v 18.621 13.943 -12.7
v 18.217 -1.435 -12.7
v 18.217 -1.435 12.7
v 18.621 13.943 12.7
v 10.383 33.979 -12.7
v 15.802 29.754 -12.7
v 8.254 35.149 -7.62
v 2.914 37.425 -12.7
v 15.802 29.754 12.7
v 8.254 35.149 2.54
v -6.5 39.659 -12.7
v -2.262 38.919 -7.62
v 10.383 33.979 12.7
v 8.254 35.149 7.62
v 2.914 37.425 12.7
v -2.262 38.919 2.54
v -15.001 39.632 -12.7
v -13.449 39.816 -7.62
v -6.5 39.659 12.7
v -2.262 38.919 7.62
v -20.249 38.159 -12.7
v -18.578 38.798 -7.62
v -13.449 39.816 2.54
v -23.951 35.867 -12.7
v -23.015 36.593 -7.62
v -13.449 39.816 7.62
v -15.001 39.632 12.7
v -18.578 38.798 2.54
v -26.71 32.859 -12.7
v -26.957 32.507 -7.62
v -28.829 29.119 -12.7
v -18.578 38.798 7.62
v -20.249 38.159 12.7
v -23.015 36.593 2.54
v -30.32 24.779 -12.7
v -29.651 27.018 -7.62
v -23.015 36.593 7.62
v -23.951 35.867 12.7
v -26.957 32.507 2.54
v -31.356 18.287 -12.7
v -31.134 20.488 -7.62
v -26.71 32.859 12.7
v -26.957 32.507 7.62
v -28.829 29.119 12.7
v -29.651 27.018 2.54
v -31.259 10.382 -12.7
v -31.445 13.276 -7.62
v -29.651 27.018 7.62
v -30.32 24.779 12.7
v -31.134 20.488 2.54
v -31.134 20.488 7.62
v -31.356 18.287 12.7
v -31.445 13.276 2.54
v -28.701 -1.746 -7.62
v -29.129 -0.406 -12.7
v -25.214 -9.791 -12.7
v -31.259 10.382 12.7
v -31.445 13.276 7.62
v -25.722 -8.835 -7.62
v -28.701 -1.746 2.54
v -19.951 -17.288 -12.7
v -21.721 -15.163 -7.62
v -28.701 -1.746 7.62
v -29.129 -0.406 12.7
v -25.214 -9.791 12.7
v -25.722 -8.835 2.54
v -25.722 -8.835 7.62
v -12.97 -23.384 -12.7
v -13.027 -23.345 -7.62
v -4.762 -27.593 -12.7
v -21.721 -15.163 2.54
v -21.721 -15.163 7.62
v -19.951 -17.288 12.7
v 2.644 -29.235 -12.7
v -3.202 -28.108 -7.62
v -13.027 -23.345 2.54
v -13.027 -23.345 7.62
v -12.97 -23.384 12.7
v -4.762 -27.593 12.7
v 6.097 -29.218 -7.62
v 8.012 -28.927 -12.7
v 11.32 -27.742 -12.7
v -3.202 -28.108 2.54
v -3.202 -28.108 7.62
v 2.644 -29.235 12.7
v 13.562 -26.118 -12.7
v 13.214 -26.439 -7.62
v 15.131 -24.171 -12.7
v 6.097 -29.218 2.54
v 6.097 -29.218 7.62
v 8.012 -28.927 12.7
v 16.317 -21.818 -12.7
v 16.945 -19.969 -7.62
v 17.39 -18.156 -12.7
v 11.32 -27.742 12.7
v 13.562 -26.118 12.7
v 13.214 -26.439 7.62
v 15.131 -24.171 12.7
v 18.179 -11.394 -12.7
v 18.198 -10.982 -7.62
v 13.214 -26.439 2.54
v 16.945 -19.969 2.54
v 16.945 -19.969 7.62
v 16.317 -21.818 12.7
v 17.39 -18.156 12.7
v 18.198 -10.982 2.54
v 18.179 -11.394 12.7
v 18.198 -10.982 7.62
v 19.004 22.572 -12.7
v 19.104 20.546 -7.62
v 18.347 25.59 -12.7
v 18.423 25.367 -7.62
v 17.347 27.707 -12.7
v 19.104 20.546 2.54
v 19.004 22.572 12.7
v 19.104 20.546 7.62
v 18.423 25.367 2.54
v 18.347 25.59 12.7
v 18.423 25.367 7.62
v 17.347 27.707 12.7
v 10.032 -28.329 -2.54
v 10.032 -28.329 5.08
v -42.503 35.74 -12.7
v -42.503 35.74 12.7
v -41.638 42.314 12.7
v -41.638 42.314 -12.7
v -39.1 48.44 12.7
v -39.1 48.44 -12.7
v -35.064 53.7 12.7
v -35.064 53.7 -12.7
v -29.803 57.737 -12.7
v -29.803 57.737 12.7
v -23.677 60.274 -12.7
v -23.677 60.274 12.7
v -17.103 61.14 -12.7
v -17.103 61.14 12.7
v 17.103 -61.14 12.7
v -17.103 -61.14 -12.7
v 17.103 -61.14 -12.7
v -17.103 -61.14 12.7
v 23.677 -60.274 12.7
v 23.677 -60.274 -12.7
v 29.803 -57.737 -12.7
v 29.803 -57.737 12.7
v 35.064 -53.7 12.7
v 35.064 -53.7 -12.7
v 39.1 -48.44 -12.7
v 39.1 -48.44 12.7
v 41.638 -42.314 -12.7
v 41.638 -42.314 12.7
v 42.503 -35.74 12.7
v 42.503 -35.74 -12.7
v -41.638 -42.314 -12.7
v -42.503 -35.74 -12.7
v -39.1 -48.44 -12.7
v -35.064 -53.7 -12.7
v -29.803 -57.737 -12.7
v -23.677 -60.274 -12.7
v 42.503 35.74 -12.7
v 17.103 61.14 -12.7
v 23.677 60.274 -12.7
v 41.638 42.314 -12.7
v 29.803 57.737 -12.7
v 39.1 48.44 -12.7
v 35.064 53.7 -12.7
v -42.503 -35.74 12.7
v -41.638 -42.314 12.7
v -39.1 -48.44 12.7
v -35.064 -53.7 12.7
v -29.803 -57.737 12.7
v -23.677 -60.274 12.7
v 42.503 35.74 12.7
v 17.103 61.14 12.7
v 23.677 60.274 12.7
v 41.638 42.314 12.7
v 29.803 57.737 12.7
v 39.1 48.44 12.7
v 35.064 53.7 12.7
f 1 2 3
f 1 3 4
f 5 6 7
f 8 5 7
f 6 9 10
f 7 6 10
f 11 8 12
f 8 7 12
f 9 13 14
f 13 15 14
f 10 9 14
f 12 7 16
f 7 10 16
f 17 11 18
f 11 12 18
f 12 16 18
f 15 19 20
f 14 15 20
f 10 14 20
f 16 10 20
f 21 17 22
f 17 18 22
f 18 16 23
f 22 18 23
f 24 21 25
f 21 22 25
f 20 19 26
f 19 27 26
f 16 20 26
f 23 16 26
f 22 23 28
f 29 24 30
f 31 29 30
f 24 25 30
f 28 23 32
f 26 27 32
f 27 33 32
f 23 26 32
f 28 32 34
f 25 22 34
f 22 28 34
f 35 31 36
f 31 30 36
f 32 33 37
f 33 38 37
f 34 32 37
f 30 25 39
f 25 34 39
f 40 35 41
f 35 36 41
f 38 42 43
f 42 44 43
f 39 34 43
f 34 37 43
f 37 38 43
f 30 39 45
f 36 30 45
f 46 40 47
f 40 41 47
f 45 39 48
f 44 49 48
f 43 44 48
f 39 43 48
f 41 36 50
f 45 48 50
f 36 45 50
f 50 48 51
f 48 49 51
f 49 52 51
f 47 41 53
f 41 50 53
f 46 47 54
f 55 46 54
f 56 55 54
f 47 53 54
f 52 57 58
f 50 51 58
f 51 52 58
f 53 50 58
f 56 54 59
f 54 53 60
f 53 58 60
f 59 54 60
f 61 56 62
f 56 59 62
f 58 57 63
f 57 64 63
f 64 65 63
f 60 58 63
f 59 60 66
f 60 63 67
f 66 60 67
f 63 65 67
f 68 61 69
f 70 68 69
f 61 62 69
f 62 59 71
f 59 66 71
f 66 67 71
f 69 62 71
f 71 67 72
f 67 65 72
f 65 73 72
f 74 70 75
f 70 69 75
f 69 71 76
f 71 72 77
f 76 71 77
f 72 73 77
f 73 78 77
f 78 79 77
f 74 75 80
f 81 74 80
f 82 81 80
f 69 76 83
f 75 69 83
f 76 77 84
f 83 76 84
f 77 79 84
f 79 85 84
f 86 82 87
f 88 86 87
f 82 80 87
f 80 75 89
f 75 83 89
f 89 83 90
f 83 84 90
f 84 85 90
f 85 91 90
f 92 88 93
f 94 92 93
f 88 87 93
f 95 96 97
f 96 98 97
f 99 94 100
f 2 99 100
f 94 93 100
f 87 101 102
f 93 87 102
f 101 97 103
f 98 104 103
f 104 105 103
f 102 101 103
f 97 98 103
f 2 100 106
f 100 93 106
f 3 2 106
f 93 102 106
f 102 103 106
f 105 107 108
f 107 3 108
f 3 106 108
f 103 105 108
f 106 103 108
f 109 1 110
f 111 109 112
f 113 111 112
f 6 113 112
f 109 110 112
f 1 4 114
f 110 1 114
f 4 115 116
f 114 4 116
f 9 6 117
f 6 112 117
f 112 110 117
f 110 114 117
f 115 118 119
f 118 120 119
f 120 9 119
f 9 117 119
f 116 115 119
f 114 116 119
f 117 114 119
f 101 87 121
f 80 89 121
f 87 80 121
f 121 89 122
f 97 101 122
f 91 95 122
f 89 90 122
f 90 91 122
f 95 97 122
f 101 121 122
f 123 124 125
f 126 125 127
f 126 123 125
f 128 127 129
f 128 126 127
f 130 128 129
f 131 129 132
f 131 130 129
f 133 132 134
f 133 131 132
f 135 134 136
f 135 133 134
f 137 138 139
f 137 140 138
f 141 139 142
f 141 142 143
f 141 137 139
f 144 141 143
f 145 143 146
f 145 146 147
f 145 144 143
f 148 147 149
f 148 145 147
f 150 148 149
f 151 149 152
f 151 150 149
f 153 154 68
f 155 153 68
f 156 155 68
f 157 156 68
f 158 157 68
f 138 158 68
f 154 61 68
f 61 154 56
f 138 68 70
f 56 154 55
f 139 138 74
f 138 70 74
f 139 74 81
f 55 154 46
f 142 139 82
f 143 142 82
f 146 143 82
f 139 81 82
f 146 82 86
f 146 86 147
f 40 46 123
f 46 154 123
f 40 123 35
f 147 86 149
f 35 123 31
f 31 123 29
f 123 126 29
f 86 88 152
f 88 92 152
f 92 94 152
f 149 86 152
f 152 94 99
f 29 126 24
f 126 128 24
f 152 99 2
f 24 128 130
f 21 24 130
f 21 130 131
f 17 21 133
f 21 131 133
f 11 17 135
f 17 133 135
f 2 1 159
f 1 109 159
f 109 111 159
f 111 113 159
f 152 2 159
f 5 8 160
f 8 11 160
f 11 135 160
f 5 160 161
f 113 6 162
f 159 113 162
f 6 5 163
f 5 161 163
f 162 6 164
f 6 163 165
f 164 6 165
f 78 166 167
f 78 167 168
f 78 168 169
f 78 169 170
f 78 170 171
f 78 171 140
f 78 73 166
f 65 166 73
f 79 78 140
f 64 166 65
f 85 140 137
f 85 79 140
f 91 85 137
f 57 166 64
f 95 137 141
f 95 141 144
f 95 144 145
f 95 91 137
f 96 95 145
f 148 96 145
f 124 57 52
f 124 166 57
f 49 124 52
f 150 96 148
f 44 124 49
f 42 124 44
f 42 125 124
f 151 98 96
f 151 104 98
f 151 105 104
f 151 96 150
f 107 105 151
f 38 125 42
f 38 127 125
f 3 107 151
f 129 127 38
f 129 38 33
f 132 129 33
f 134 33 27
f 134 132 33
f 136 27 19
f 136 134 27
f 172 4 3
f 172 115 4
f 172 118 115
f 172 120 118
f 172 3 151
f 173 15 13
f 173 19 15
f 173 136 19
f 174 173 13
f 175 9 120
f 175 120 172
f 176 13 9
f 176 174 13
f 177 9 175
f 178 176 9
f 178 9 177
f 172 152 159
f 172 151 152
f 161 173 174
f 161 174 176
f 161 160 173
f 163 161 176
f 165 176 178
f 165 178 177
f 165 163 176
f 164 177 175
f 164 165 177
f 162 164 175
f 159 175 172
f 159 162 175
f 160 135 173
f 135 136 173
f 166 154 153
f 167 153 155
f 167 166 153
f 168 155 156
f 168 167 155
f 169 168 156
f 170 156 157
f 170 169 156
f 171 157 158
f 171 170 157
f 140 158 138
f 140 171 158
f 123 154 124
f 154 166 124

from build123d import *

# Parameters (mm, degrees)
F0_W     = 85.0064009428
F0_H     = 122.2794502974
F1_DEPTH = 12.7
F3_DEPTH = 25.4
F4_R     = 25.4


with BuildPart() as f1:
    # F0 (on Top) → F1 (new body, symmetric)
    with BuildSketch(Plane.XY):
        Rectangle(F0_W, F0_H)
    extrude(amount=F1_DEPTH, both=True)

    # F2 (on face) → F3 (cut)
    with BuildSketch(Plane.XY.offset(12.7)):
        with BuildLine():
            add(Edge.make_bspline(
                [(15.8021897078, 29.7542437911), (8.7349150661, 37.4751844421), (-36.540654392, 51.889146526), (-32.4468782742, -22.7903155442), (23.1560198555, -37.3585935892), (15.5628704988, 9.8626539685), (20.9863491185, 24.09059137), (15.8021897078, 29.7542437911)],
                knots=[0, 0, 0, 0, 0.2086208524, 0.4477187277, 0.6490534164, 0.8469673516, 1, 1, 1, 1], degree=3))
        make_face()
    extrude(amount=-F3_DEPTH, mode=Mode.SUBTRACT)

    # F4
    f4_edges = [f1.edges().sort_by_distance(p)[0] for p in [
        (-42.5032, -61.139725, 0),
        (42.5032, -61.139725, 0),
        (42.5032, 61.139725, 0),
        (-42.5032, 61.139725, 0),
    ]]
    fillet(f4_edges, radius=F4_R)


solid = f1.part
